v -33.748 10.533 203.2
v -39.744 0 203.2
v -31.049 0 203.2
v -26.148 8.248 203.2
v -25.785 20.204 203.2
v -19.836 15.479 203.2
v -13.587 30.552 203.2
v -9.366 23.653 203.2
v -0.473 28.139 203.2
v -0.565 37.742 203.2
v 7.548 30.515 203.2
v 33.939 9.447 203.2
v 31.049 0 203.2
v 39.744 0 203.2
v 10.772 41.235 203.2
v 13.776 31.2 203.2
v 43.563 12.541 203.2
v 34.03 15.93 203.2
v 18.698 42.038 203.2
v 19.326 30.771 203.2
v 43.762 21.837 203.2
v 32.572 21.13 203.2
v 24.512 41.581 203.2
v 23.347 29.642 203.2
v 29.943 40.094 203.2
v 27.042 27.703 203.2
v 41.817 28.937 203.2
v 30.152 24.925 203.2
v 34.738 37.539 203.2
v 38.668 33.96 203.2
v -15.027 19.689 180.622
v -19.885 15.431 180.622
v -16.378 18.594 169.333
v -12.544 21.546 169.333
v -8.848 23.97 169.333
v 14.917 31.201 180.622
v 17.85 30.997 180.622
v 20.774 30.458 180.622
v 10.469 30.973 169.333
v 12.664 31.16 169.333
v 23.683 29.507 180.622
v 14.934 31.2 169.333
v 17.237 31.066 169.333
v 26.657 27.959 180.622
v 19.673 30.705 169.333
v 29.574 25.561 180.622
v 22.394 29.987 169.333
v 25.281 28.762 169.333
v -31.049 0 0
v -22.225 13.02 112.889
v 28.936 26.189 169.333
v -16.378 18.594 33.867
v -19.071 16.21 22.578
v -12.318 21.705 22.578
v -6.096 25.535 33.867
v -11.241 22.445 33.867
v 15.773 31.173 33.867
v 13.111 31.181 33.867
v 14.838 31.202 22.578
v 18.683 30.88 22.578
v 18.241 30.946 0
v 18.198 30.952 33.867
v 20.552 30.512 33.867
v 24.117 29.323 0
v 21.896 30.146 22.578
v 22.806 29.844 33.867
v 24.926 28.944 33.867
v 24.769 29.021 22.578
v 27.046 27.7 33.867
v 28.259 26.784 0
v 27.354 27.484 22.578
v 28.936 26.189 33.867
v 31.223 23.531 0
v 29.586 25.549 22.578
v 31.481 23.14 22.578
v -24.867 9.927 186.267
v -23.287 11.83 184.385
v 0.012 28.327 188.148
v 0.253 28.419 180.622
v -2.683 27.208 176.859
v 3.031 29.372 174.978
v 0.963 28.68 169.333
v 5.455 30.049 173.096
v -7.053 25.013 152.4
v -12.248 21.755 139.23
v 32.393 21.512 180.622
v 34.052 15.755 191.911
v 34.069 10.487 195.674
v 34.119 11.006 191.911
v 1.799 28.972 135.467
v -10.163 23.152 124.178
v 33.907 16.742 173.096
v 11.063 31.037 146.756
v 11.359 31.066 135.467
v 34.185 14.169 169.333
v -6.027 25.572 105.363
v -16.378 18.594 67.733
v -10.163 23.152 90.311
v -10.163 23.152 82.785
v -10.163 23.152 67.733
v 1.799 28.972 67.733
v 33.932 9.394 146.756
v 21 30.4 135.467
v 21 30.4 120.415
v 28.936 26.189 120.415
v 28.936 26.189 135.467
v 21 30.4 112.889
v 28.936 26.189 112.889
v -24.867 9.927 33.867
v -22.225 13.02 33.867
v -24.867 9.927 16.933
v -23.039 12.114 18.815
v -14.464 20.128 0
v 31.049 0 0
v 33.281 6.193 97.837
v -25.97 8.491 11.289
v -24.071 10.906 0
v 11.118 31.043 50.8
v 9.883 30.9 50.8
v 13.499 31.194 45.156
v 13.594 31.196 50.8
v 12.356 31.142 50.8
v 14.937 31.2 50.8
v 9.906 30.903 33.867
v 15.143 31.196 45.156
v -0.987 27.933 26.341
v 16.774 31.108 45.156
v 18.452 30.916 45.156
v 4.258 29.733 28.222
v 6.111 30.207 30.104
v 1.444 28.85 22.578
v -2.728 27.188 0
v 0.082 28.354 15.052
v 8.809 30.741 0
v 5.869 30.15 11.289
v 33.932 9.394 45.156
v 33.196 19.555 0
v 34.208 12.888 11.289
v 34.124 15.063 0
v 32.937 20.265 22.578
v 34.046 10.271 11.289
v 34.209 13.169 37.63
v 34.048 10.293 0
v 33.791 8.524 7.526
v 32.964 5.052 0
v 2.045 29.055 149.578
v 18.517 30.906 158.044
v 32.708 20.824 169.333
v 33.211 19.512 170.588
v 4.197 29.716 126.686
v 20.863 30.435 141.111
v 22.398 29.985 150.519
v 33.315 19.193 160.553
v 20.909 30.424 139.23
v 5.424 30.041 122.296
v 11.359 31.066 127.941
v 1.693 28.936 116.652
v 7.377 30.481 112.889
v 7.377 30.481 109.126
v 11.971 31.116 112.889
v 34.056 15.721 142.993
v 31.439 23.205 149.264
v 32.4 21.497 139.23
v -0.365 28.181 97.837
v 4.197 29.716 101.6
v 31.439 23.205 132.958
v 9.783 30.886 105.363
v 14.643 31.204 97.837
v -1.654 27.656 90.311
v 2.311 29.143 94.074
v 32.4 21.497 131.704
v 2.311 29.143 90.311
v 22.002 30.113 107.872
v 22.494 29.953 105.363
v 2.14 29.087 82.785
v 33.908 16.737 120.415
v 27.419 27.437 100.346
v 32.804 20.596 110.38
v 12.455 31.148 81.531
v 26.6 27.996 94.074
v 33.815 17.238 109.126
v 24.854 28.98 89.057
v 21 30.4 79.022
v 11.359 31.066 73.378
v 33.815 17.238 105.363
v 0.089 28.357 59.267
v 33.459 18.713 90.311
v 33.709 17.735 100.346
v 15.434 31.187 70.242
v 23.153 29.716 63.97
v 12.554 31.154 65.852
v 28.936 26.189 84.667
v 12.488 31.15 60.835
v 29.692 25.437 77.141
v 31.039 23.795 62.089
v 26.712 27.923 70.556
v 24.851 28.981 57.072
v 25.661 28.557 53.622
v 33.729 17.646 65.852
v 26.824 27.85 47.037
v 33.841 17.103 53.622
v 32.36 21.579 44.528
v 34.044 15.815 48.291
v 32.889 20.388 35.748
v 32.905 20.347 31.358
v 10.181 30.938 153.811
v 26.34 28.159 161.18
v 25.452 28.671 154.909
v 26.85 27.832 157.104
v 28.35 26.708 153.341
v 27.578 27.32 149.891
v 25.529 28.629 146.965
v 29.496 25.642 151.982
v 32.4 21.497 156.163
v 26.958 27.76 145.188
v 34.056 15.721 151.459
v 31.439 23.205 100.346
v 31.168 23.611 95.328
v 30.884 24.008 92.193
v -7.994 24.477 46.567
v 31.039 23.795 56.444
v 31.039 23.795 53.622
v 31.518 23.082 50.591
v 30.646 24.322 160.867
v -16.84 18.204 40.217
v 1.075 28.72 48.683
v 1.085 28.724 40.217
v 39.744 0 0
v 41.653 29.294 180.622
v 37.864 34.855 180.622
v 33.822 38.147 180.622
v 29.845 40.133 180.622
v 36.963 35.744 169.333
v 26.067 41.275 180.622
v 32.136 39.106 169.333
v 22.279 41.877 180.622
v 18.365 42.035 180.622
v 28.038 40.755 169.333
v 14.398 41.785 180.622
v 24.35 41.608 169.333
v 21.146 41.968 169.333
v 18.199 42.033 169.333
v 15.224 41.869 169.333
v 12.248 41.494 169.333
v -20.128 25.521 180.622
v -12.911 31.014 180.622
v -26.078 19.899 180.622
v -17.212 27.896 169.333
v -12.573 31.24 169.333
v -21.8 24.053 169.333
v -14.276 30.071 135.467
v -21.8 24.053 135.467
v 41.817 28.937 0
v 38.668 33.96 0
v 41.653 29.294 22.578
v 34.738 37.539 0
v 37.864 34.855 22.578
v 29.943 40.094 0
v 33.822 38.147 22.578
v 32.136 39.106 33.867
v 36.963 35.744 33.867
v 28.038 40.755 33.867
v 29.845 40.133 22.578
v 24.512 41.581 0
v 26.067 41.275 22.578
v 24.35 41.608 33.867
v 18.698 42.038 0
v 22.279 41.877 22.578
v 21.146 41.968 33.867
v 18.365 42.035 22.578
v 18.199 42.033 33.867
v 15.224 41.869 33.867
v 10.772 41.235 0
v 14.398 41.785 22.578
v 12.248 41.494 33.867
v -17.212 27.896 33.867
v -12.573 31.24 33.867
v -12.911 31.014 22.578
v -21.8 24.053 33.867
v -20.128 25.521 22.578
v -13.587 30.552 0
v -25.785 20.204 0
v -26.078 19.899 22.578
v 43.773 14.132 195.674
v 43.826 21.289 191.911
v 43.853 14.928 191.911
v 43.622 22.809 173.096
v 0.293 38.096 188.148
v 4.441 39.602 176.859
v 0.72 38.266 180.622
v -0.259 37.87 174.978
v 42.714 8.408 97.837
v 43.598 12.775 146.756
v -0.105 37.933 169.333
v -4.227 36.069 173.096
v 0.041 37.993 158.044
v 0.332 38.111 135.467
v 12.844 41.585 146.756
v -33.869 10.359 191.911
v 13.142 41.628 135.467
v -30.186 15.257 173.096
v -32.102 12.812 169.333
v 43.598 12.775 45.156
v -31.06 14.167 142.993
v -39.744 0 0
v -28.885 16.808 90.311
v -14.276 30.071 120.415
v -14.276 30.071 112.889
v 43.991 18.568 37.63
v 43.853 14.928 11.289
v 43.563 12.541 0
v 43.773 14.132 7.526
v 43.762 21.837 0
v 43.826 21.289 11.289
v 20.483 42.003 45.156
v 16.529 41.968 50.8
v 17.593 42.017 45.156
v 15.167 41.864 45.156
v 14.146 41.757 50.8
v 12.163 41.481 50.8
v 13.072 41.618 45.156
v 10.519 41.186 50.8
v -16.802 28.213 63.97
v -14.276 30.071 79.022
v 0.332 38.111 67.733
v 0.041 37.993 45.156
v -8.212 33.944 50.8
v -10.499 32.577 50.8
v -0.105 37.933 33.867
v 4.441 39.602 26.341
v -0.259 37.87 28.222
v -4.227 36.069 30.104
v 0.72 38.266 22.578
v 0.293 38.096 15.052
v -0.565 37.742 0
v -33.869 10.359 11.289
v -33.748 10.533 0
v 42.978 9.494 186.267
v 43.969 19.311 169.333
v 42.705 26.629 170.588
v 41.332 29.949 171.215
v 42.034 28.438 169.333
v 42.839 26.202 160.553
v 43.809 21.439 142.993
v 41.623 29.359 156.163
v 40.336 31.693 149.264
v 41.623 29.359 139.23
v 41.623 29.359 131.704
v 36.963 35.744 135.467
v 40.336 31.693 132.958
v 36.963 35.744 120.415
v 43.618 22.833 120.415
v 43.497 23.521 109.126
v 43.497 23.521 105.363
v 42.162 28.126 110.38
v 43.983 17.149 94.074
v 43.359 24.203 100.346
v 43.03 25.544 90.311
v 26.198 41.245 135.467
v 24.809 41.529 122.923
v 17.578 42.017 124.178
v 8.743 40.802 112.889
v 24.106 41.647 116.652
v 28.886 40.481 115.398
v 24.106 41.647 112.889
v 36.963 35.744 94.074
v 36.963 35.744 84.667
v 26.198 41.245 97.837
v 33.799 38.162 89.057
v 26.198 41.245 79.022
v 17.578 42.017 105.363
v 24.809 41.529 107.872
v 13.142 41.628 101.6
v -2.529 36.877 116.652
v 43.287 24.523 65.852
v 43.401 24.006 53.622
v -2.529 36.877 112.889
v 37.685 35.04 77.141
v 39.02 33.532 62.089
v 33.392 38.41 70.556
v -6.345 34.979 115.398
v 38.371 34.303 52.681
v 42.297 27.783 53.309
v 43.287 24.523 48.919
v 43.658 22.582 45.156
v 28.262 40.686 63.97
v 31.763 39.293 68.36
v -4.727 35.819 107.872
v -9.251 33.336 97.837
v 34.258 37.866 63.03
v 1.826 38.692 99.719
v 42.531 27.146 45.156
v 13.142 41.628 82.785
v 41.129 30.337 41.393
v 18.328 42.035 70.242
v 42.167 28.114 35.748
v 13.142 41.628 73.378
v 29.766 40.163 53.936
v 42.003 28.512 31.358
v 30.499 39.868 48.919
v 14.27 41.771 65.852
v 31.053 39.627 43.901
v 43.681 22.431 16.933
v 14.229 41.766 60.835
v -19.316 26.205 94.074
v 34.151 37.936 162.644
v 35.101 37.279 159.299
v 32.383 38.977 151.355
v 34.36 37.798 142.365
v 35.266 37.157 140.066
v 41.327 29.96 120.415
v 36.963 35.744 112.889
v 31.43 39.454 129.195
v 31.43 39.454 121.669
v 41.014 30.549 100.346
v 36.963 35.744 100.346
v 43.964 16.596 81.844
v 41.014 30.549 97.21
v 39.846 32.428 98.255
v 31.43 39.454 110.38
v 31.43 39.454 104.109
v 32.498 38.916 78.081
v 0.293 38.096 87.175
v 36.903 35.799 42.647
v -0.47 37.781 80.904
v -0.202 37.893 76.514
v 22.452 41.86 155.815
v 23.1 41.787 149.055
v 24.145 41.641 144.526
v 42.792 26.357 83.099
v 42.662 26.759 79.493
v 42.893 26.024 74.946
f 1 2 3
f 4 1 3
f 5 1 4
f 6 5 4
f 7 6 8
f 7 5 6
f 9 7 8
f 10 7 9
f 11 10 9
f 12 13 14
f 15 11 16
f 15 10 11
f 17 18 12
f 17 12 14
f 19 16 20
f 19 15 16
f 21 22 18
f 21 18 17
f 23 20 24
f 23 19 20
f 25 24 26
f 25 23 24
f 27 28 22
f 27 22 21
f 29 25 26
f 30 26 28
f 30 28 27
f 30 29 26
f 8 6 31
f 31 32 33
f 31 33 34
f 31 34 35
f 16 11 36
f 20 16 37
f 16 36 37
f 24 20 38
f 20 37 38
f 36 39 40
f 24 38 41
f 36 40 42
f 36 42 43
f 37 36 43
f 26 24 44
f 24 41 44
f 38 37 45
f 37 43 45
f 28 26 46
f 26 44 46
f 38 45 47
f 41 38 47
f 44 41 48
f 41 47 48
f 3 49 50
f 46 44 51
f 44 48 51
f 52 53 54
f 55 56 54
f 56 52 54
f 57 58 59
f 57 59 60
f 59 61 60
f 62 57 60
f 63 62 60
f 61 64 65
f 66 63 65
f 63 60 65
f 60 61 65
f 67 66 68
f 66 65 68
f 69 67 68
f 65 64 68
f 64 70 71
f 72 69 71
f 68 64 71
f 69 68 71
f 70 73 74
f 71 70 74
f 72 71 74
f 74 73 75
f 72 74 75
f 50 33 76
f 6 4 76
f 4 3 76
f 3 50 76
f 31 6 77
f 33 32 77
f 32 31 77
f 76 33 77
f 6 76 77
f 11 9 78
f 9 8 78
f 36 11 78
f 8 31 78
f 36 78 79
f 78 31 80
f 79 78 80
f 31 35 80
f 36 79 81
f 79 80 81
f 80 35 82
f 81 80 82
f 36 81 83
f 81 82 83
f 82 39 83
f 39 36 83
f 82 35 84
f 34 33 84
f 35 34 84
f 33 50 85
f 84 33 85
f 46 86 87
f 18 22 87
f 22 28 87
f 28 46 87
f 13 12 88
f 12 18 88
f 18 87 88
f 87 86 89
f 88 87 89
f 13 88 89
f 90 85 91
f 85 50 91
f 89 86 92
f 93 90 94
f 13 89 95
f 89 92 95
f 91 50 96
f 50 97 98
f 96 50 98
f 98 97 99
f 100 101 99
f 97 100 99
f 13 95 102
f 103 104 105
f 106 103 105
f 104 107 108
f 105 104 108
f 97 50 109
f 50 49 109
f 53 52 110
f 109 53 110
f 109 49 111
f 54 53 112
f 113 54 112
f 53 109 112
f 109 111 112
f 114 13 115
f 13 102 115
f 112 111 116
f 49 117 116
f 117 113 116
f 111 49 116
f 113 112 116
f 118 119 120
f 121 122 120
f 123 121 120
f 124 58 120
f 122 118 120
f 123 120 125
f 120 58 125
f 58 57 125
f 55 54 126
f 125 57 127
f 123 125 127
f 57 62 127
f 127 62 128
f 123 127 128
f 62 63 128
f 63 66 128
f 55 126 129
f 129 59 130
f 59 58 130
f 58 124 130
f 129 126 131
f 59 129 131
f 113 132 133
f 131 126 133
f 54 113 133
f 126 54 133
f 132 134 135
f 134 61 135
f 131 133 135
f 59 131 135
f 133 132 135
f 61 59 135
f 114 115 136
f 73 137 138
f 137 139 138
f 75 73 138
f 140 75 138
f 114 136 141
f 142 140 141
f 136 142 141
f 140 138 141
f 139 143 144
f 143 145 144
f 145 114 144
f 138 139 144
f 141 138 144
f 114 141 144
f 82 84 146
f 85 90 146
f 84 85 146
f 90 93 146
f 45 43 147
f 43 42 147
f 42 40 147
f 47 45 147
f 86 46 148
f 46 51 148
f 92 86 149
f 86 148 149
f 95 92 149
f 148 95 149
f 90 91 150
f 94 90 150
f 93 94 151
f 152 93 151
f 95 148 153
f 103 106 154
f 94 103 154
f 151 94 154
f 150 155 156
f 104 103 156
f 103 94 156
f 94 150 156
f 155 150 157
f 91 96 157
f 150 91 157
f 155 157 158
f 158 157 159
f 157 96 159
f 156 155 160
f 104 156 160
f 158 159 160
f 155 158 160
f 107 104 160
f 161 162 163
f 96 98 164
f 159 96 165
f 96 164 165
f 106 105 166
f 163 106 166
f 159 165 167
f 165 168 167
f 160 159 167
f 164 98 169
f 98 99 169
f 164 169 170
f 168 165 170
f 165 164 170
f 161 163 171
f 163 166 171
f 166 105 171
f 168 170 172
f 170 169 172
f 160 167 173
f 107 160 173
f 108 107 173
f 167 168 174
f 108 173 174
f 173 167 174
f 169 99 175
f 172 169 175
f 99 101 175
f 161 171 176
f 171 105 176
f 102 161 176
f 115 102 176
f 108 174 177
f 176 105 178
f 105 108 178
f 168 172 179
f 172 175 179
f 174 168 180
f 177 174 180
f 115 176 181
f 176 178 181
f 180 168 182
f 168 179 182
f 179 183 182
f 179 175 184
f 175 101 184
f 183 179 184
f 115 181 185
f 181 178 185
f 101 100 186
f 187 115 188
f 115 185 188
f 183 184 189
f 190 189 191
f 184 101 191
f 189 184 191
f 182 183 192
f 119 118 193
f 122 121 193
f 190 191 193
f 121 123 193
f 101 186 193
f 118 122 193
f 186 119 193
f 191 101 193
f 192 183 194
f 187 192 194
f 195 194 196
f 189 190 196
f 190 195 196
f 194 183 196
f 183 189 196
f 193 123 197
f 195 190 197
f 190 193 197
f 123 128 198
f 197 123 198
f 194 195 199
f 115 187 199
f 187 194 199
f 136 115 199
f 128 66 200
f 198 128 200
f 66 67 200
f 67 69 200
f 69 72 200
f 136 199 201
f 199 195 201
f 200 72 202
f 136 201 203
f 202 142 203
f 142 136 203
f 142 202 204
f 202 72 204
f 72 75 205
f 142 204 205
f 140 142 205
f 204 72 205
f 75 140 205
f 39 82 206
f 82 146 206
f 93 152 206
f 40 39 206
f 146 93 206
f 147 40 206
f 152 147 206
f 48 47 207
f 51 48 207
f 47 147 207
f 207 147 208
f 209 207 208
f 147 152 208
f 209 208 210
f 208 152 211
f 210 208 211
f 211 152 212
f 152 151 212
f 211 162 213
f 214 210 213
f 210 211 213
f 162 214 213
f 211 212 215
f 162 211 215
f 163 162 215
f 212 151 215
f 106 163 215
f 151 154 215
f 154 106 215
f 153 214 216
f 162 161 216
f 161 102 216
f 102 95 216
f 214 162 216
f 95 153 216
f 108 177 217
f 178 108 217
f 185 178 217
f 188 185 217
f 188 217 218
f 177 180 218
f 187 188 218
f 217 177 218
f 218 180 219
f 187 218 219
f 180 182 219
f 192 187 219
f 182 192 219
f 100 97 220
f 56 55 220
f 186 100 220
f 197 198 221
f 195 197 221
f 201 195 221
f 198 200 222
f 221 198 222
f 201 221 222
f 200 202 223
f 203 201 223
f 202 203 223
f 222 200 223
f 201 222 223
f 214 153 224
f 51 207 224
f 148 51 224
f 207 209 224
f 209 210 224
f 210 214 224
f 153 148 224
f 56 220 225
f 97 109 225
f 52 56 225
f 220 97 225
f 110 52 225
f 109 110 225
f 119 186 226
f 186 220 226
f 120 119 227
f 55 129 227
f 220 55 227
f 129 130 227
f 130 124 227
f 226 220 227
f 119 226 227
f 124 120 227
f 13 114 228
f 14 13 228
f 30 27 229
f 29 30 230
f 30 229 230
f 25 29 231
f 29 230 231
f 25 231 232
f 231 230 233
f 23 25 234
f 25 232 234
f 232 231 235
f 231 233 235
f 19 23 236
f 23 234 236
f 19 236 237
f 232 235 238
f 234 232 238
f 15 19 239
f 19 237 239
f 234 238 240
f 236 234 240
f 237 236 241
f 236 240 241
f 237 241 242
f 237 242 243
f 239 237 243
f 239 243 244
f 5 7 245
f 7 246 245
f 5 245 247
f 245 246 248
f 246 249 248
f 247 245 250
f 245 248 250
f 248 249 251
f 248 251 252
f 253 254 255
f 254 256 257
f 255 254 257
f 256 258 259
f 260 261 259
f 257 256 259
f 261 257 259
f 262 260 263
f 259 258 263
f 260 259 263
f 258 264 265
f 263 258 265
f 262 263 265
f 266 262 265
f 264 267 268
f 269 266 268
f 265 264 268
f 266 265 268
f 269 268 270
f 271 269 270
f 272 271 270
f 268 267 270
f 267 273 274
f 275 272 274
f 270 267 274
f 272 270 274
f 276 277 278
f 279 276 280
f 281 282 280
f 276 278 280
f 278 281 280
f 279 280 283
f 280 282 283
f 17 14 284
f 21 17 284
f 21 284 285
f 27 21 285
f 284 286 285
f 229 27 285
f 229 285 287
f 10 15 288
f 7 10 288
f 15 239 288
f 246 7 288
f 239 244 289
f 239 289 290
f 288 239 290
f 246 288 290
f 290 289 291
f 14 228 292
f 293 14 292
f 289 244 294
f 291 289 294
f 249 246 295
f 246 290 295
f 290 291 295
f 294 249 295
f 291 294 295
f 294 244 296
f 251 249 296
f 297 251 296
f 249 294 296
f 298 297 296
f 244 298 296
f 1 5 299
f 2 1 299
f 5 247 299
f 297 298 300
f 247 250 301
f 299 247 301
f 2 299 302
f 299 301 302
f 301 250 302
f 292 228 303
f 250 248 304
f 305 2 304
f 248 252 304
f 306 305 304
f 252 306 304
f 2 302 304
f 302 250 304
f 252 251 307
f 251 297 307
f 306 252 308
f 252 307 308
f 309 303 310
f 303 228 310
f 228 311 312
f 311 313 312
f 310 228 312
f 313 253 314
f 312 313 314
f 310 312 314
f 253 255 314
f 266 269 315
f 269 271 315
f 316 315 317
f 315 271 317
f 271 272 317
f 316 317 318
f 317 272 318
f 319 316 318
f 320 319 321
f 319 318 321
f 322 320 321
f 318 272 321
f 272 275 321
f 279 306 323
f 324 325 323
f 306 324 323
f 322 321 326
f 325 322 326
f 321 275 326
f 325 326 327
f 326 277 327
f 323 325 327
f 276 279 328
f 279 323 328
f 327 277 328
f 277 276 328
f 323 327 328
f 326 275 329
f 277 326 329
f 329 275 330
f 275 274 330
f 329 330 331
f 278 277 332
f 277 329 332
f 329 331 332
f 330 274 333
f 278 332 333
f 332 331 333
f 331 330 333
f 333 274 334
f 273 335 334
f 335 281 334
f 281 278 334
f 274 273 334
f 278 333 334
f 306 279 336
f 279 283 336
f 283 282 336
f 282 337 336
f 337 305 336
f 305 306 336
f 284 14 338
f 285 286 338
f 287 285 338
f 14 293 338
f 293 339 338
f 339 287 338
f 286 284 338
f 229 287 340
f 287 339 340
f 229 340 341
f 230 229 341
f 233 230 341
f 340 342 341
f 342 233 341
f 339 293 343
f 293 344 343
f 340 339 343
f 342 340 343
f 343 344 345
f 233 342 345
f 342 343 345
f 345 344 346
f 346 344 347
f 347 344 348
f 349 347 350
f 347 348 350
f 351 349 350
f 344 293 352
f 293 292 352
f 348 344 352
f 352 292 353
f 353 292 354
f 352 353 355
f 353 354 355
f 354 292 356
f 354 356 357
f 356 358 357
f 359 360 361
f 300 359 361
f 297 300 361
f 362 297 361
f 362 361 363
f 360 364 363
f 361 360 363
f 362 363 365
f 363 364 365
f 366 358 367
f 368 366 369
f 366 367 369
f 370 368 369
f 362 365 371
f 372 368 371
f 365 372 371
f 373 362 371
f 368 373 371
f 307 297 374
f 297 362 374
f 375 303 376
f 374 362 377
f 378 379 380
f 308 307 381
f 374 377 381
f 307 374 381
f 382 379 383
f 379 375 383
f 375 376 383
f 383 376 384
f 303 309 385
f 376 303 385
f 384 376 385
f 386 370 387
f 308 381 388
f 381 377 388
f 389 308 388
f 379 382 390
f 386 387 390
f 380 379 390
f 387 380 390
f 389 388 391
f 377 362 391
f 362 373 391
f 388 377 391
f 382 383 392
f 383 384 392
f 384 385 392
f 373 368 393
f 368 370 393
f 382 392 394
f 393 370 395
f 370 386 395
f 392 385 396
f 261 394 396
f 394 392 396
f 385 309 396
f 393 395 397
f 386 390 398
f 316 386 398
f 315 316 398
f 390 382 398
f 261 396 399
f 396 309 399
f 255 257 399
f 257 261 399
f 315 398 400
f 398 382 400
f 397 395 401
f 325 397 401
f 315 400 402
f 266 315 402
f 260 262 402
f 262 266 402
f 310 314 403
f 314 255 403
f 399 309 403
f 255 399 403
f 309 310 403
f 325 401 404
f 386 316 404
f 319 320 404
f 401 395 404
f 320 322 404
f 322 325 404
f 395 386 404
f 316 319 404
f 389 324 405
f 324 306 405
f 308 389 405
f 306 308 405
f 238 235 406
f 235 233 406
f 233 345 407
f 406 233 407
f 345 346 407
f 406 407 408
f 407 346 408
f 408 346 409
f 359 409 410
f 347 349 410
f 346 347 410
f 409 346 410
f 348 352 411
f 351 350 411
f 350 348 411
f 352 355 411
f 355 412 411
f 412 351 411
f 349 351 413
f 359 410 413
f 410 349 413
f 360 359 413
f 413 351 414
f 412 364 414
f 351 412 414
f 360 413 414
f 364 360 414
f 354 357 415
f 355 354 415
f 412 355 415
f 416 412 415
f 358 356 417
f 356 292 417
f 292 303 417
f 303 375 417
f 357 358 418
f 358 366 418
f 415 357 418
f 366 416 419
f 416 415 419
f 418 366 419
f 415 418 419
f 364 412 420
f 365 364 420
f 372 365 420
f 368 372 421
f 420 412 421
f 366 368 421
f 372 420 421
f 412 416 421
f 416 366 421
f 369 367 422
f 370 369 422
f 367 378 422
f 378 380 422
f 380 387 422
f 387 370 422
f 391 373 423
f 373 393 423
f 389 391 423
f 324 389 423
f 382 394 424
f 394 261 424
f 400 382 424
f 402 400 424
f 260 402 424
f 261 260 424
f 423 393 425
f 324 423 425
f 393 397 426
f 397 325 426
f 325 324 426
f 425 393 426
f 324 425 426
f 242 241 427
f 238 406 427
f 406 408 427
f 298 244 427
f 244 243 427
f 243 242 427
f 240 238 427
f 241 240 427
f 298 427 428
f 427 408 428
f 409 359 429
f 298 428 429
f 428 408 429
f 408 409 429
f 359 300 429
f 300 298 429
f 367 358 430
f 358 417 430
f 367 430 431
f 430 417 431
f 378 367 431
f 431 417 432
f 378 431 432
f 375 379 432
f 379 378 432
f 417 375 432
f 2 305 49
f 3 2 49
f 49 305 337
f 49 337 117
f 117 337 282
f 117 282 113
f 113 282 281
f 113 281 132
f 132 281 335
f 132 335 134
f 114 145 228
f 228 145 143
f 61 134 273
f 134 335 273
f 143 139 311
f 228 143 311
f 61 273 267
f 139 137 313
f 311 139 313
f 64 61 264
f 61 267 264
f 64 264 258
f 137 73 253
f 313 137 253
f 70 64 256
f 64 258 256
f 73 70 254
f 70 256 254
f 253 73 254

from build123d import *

# Parameters (mm, degrees)
F1_DEPTH = 203.2
F4_DEPTH = 203.2010001
F5_W     = 286.5282446146
F5_H     = 301.3309016824
F6_DEPTH = 76.2


with BuildPart() as f1:
    # F0 (on Top) → F1 (new body)
    with BuildSketch(Plane.XY):
        with BuildLine():
            add(Edge.make_bspline(
                [(-38.2656529546, -34.4207771122), (-0.6638671702, -76.2227643424), (37.9337193695, -3.690605059), (76.5313059092, 68.8415542245), (0.3319335851, 38.1113821712), (-75.867438739, 7.3812101179), (-38.2656529546, -34.4207771122)],
                knots=[0, 0, 0, 2.0943951024, 2.0943951024, 4.1887902048, 4.1887902048, 6.2831853072, 6.2831853072, 6.2831853072], degree=2, weights=[1, 0.5, 1, 0.5, 1, 0.5, 1]))
        make_face()
    extrude(amount=F1_DEPTH)

    # F3 (on face) → F4 (cut, through all)
    with BuildSketch(Plane(origin=(0, 0, 0), x_dir=(1, 0, 0), z_dir=(0, 0, -1))):
        with BuildLine():
            add(Edge.make_bspline(
                [(-30.4845999926, 24.5260708034), (-57.3712727472, -8.8926317123), (1.798963619, -28.9723866595), (60.9691999853, -49.0521416068), (28.6856363736, 4.4463158561), (-3.597927238, 57.9447733191), (-30.4845999926, 24.5260708034)],
                knots=[0, 0, 0, 2.0943951024, 2.0943951024, 4.1887902048, 4.1887902048, 6.2831853072, 6.2831853072, 6.2831853072], degree=2, weights=[1, 0.5, 1, 0.5, 1, 0.5, 1]))
        make_face()
    extrude(amount=-F4_DEPTH, mode=Mode.SUBTRACT)

    # F5 (on Front) → F6 (cut)
    with BuildSketch(Plane.XZ):
        with Locations((-13.1542161107, 72.5056491792)):
            Rectangle(F5_W, F5_H)
    extrude(amount=F6_DEPTH, mode=Mode.SUBTRACT)


solid = f1.part
